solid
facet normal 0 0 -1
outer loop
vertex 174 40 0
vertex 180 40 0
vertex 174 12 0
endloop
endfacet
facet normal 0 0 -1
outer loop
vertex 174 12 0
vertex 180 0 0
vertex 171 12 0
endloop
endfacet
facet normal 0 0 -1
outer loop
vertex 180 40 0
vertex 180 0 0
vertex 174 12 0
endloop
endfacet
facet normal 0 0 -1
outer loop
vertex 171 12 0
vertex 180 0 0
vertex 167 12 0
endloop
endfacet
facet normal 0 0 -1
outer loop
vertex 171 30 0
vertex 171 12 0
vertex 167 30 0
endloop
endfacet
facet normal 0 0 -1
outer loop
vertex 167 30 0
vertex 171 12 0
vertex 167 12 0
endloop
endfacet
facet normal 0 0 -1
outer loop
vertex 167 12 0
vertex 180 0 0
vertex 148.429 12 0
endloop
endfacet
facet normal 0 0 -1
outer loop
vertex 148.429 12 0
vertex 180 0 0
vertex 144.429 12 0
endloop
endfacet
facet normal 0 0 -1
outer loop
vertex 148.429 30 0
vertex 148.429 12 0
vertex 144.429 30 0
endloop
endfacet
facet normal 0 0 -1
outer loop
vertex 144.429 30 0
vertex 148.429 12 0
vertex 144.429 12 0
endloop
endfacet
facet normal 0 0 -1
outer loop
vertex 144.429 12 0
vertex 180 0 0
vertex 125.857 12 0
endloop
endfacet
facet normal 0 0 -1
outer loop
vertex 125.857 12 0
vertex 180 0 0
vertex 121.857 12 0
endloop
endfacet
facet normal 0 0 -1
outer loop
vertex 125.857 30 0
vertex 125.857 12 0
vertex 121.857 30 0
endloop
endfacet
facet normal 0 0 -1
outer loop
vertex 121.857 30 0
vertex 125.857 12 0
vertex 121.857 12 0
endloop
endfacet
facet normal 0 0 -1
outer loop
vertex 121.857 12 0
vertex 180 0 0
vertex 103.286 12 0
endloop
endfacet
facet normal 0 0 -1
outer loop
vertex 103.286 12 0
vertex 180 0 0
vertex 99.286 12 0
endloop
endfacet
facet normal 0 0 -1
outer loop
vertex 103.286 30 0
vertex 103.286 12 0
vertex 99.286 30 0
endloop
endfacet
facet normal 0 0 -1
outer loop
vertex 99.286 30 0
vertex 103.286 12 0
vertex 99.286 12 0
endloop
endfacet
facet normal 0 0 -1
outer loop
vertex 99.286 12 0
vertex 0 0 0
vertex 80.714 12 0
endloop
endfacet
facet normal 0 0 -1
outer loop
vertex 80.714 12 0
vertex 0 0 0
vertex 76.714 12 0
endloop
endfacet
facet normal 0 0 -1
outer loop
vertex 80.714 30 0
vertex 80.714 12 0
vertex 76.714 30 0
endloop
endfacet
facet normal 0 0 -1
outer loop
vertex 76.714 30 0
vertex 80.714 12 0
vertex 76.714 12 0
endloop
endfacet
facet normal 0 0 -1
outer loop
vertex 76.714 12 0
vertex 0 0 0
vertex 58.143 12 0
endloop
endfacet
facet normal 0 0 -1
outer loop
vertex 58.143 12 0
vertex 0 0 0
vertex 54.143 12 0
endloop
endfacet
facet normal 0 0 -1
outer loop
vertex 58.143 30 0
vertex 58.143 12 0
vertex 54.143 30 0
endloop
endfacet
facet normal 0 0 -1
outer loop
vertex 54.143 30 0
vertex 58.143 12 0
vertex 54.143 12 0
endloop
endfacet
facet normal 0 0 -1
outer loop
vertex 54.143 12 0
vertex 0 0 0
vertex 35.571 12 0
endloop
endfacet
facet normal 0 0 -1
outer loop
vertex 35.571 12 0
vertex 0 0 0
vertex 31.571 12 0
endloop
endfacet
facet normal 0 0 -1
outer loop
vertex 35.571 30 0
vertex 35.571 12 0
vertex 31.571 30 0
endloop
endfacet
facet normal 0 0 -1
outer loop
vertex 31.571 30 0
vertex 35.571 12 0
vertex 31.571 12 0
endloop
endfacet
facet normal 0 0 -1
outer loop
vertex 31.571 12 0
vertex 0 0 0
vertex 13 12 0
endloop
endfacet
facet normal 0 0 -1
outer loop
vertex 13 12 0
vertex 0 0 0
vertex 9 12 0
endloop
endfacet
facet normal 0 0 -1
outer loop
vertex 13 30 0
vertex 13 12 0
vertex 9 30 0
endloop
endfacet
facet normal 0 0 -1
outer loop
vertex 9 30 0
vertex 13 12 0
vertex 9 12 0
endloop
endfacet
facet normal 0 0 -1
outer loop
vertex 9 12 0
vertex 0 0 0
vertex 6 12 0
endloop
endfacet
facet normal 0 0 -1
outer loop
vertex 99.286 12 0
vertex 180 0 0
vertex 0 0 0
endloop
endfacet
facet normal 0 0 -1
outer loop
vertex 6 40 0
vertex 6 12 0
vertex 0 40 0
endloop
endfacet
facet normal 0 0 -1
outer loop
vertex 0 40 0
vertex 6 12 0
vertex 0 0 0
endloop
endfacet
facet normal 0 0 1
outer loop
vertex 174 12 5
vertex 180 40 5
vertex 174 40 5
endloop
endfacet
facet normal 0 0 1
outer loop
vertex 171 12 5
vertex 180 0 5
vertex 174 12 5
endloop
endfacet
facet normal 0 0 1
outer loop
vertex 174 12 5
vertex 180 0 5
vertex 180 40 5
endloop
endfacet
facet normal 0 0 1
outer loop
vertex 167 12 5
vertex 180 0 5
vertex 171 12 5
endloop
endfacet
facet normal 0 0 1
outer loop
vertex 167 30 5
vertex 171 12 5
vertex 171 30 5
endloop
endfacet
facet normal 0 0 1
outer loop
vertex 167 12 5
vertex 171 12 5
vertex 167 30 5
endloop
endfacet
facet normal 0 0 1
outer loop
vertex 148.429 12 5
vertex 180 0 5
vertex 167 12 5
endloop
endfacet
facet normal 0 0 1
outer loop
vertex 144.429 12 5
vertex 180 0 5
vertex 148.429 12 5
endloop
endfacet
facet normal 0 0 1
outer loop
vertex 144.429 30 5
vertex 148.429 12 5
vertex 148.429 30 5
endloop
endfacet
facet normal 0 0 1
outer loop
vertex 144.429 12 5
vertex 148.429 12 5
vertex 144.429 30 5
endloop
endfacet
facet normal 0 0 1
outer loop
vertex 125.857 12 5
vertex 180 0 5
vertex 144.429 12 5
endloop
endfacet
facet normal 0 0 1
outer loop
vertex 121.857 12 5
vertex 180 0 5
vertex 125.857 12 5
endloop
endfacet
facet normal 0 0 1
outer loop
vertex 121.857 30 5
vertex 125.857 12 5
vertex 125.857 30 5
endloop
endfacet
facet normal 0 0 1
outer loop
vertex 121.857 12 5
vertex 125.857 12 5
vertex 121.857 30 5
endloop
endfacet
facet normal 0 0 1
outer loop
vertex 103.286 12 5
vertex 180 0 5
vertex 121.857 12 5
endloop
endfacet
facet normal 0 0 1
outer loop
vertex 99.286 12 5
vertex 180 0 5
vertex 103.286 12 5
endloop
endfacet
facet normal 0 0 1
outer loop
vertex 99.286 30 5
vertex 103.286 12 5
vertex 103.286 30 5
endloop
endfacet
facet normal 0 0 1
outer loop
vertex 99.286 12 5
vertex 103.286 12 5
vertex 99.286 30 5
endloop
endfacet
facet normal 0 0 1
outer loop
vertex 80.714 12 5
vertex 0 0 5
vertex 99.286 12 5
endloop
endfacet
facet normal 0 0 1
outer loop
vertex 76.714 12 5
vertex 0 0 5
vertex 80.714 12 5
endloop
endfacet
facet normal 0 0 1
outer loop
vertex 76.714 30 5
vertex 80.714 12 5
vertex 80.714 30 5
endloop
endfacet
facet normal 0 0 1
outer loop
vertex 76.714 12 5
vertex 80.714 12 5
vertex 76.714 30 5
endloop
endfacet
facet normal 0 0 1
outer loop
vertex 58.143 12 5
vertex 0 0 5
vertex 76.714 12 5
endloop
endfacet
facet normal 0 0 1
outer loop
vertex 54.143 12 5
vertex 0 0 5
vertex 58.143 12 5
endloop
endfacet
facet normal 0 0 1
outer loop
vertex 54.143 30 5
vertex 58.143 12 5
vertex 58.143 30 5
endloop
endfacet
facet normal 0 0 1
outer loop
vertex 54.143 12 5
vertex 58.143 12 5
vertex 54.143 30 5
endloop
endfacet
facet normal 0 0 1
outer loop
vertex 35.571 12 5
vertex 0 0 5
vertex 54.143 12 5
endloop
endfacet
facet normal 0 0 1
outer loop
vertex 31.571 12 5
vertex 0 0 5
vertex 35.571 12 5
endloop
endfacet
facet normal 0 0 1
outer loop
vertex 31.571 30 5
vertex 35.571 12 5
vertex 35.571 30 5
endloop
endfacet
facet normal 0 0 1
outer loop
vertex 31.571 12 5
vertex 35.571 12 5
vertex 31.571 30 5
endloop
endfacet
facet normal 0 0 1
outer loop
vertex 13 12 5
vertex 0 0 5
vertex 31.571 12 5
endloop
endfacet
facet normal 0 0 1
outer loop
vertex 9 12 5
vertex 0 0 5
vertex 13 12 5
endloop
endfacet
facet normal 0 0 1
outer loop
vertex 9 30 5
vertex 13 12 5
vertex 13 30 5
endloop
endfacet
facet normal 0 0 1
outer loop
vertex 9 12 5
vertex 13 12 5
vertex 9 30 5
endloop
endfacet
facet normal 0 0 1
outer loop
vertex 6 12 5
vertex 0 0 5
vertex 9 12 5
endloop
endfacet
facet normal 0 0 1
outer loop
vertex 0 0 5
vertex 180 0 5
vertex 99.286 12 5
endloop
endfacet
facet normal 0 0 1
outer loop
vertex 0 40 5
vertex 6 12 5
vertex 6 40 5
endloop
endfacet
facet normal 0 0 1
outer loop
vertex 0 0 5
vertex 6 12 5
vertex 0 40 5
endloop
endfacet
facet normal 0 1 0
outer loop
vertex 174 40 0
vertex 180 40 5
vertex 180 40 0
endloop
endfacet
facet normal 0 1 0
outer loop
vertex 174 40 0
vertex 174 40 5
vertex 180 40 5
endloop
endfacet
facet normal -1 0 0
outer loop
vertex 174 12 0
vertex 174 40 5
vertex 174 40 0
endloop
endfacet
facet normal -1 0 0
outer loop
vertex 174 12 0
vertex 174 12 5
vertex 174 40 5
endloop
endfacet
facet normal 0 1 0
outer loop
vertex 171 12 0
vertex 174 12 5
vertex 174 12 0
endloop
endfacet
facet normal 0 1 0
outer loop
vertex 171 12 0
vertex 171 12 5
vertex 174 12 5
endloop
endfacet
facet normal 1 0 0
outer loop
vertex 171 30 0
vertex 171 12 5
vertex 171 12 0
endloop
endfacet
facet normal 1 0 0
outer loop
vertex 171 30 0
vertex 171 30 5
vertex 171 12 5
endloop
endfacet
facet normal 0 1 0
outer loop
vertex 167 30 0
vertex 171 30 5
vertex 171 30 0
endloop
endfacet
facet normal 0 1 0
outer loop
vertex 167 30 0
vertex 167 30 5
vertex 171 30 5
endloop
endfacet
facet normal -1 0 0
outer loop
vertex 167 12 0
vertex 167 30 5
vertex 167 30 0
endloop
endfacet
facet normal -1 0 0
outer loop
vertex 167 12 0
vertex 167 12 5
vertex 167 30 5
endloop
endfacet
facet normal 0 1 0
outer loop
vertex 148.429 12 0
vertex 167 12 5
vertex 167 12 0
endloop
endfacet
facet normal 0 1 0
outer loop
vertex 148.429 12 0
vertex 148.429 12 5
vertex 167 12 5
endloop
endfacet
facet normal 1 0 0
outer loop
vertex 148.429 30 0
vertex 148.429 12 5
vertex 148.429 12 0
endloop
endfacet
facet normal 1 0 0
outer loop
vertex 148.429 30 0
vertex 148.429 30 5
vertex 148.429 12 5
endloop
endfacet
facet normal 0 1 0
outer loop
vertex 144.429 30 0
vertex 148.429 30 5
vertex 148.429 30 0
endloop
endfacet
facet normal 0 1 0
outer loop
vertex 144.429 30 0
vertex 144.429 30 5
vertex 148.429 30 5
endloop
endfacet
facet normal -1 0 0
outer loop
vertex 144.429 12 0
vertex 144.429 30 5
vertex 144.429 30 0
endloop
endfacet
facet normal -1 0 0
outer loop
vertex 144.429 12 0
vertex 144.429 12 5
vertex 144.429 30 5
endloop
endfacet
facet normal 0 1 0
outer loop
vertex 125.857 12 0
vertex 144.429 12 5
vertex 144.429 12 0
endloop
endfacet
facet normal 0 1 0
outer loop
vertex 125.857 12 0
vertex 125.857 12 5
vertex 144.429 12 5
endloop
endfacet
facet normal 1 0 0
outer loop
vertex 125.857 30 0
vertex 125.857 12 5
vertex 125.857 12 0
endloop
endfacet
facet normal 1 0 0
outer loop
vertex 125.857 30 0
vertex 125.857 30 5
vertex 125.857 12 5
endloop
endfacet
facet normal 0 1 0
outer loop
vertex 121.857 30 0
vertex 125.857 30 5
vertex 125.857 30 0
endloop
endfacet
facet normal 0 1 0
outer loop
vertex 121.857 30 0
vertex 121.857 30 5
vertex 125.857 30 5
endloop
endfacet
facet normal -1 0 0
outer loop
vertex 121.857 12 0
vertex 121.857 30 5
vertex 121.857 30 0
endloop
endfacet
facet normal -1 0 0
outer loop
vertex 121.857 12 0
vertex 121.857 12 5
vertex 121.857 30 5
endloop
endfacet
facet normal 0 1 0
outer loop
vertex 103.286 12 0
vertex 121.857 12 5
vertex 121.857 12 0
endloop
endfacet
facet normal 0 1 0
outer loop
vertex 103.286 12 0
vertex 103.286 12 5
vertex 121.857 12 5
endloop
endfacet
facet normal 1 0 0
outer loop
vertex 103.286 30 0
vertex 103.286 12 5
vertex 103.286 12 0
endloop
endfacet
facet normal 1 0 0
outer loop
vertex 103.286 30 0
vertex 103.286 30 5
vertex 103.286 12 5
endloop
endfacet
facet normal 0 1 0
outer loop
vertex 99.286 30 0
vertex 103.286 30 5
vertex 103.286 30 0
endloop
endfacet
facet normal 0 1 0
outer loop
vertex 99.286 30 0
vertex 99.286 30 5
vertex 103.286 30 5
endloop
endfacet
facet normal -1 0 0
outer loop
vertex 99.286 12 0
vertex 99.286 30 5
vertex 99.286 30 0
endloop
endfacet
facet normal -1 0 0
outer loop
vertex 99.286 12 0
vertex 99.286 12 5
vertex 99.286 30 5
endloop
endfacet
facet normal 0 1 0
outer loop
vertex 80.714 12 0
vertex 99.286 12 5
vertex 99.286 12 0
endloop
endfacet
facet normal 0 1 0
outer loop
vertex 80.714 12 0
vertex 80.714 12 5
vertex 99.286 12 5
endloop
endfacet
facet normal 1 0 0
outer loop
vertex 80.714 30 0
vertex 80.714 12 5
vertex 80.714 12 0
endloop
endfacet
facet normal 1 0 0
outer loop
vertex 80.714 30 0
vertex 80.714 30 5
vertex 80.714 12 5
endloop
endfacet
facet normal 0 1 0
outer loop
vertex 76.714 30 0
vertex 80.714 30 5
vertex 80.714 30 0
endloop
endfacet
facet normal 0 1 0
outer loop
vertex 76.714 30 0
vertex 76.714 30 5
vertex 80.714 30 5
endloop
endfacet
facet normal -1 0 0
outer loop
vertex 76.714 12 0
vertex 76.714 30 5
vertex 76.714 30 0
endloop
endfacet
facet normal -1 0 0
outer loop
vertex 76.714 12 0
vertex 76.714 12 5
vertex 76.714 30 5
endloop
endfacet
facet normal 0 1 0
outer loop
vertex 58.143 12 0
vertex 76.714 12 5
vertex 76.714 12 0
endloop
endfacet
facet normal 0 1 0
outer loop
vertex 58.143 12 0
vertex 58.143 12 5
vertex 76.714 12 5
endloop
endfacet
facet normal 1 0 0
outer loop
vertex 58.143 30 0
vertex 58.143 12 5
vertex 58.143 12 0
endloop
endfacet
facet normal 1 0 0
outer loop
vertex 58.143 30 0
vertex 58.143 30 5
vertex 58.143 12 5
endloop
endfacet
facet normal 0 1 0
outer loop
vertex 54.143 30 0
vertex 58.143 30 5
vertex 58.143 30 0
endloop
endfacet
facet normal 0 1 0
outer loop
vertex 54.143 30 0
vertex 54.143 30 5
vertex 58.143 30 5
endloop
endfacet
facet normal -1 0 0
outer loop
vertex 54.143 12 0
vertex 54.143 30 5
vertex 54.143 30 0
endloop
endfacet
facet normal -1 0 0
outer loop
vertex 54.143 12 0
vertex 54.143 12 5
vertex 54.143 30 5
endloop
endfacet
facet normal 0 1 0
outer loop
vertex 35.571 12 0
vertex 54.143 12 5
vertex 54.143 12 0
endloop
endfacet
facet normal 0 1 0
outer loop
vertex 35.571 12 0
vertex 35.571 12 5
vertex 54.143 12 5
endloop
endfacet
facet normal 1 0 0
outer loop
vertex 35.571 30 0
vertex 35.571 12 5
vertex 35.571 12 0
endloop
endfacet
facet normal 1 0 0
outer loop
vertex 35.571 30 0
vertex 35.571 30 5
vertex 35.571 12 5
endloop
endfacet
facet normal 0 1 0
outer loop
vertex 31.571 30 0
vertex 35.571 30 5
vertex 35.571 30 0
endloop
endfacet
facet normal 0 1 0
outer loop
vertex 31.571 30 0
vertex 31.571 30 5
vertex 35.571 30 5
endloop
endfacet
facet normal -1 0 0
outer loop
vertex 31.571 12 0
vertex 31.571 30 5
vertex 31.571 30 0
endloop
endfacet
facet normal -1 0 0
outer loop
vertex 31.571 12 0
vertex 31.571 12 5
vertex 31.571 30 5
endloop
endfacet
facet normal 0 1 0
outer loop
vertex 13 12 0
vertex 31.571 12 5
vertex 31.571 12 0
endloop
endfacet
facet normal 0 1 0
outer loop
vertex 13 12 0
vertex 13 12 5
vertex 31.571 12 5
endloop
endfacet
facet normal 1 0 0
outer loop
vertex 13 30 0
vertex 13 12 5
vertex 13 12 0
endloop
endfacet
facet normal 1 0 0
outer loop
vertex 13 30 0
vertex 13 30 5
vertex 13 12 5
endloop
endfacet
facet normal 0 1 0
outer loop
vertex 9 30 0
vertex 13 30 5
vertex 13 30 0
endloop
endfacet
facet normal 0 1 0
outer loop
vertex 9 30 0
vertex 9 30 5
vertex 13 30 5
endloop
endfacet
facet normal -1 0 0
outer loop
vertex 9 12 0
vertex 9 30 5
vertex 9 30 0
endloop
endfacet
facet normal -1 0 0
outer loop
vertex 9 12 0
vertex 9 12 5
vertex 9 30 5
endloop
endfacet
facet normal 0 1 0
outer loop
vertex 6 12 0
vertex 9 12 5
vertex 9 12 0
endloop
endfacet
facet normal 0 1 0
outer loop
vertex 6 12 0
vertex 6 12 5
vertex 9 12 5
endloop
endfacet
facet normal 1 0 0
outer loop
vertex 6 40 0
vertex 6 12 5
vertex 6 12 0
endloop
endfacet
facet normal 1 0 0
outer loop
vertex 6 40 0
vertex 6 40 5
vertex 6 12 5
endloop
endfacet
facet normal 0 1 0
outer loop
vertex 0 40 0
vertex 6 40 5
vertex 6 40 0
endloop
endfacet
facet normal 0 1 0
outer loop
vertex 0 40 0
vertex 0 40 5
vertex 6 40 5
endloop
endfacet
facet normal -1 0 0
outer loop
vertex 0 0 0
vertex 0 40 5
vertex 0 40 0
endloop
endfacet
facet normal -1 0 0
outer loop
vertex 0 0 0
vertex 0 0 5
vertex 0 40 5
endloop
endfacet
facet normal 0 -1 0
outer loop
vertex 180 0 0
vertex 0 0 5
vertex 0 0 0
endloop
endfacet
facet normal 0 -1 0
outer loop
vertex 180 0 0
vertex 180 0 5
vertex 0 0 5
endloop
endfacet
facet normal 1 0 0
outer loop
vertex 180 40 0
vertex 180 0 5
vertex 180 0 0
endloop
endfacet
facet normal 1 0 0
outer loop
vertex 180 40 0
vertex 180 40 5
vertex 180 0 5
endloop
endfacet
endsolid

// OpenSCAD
$fn = 32;

// ----------------------------------------------------------------------
// Guard grille: 8 slats over a 180 x 40 mm plate
// ----------------------------------------------------------------------

// --- parameters (mm) ---
profile_height = 5;       // extrusion height
profile_points = 40;      // points of the closed outline

profile = [[0, 0], [180, 0], [180, 40], [174, 40], [174, 12], [171, 12], [171, 30], [167, 30], [167, 12], [148.429, 12], [148.429, 30], [144.429, 30], [144.429, 12], [125.857, 12], [125.857, 30], [121.857, 30], [121.857, 12], [103.286, 12], [103.286, 30], [99.286, 30], [99.286, 12], [80.714, 12], [80.714, 30], [76.714, 30], [76.714, 12], [58.143, 12], [58.143, 30], [54.143, 30], [54.143, 12], [35.571, 12], [35.571, 30], [31.571, 30], [31.571, 12], [13, 12], [13, 30], [9, 30], [9, 12], [6, 12], [6, 40], [0, 40]];  // single closed polygon, 40 points, counter clockwise

// --- the one profile operation ---
linear_extrude(height = profile_height) polygon(points = profile);
